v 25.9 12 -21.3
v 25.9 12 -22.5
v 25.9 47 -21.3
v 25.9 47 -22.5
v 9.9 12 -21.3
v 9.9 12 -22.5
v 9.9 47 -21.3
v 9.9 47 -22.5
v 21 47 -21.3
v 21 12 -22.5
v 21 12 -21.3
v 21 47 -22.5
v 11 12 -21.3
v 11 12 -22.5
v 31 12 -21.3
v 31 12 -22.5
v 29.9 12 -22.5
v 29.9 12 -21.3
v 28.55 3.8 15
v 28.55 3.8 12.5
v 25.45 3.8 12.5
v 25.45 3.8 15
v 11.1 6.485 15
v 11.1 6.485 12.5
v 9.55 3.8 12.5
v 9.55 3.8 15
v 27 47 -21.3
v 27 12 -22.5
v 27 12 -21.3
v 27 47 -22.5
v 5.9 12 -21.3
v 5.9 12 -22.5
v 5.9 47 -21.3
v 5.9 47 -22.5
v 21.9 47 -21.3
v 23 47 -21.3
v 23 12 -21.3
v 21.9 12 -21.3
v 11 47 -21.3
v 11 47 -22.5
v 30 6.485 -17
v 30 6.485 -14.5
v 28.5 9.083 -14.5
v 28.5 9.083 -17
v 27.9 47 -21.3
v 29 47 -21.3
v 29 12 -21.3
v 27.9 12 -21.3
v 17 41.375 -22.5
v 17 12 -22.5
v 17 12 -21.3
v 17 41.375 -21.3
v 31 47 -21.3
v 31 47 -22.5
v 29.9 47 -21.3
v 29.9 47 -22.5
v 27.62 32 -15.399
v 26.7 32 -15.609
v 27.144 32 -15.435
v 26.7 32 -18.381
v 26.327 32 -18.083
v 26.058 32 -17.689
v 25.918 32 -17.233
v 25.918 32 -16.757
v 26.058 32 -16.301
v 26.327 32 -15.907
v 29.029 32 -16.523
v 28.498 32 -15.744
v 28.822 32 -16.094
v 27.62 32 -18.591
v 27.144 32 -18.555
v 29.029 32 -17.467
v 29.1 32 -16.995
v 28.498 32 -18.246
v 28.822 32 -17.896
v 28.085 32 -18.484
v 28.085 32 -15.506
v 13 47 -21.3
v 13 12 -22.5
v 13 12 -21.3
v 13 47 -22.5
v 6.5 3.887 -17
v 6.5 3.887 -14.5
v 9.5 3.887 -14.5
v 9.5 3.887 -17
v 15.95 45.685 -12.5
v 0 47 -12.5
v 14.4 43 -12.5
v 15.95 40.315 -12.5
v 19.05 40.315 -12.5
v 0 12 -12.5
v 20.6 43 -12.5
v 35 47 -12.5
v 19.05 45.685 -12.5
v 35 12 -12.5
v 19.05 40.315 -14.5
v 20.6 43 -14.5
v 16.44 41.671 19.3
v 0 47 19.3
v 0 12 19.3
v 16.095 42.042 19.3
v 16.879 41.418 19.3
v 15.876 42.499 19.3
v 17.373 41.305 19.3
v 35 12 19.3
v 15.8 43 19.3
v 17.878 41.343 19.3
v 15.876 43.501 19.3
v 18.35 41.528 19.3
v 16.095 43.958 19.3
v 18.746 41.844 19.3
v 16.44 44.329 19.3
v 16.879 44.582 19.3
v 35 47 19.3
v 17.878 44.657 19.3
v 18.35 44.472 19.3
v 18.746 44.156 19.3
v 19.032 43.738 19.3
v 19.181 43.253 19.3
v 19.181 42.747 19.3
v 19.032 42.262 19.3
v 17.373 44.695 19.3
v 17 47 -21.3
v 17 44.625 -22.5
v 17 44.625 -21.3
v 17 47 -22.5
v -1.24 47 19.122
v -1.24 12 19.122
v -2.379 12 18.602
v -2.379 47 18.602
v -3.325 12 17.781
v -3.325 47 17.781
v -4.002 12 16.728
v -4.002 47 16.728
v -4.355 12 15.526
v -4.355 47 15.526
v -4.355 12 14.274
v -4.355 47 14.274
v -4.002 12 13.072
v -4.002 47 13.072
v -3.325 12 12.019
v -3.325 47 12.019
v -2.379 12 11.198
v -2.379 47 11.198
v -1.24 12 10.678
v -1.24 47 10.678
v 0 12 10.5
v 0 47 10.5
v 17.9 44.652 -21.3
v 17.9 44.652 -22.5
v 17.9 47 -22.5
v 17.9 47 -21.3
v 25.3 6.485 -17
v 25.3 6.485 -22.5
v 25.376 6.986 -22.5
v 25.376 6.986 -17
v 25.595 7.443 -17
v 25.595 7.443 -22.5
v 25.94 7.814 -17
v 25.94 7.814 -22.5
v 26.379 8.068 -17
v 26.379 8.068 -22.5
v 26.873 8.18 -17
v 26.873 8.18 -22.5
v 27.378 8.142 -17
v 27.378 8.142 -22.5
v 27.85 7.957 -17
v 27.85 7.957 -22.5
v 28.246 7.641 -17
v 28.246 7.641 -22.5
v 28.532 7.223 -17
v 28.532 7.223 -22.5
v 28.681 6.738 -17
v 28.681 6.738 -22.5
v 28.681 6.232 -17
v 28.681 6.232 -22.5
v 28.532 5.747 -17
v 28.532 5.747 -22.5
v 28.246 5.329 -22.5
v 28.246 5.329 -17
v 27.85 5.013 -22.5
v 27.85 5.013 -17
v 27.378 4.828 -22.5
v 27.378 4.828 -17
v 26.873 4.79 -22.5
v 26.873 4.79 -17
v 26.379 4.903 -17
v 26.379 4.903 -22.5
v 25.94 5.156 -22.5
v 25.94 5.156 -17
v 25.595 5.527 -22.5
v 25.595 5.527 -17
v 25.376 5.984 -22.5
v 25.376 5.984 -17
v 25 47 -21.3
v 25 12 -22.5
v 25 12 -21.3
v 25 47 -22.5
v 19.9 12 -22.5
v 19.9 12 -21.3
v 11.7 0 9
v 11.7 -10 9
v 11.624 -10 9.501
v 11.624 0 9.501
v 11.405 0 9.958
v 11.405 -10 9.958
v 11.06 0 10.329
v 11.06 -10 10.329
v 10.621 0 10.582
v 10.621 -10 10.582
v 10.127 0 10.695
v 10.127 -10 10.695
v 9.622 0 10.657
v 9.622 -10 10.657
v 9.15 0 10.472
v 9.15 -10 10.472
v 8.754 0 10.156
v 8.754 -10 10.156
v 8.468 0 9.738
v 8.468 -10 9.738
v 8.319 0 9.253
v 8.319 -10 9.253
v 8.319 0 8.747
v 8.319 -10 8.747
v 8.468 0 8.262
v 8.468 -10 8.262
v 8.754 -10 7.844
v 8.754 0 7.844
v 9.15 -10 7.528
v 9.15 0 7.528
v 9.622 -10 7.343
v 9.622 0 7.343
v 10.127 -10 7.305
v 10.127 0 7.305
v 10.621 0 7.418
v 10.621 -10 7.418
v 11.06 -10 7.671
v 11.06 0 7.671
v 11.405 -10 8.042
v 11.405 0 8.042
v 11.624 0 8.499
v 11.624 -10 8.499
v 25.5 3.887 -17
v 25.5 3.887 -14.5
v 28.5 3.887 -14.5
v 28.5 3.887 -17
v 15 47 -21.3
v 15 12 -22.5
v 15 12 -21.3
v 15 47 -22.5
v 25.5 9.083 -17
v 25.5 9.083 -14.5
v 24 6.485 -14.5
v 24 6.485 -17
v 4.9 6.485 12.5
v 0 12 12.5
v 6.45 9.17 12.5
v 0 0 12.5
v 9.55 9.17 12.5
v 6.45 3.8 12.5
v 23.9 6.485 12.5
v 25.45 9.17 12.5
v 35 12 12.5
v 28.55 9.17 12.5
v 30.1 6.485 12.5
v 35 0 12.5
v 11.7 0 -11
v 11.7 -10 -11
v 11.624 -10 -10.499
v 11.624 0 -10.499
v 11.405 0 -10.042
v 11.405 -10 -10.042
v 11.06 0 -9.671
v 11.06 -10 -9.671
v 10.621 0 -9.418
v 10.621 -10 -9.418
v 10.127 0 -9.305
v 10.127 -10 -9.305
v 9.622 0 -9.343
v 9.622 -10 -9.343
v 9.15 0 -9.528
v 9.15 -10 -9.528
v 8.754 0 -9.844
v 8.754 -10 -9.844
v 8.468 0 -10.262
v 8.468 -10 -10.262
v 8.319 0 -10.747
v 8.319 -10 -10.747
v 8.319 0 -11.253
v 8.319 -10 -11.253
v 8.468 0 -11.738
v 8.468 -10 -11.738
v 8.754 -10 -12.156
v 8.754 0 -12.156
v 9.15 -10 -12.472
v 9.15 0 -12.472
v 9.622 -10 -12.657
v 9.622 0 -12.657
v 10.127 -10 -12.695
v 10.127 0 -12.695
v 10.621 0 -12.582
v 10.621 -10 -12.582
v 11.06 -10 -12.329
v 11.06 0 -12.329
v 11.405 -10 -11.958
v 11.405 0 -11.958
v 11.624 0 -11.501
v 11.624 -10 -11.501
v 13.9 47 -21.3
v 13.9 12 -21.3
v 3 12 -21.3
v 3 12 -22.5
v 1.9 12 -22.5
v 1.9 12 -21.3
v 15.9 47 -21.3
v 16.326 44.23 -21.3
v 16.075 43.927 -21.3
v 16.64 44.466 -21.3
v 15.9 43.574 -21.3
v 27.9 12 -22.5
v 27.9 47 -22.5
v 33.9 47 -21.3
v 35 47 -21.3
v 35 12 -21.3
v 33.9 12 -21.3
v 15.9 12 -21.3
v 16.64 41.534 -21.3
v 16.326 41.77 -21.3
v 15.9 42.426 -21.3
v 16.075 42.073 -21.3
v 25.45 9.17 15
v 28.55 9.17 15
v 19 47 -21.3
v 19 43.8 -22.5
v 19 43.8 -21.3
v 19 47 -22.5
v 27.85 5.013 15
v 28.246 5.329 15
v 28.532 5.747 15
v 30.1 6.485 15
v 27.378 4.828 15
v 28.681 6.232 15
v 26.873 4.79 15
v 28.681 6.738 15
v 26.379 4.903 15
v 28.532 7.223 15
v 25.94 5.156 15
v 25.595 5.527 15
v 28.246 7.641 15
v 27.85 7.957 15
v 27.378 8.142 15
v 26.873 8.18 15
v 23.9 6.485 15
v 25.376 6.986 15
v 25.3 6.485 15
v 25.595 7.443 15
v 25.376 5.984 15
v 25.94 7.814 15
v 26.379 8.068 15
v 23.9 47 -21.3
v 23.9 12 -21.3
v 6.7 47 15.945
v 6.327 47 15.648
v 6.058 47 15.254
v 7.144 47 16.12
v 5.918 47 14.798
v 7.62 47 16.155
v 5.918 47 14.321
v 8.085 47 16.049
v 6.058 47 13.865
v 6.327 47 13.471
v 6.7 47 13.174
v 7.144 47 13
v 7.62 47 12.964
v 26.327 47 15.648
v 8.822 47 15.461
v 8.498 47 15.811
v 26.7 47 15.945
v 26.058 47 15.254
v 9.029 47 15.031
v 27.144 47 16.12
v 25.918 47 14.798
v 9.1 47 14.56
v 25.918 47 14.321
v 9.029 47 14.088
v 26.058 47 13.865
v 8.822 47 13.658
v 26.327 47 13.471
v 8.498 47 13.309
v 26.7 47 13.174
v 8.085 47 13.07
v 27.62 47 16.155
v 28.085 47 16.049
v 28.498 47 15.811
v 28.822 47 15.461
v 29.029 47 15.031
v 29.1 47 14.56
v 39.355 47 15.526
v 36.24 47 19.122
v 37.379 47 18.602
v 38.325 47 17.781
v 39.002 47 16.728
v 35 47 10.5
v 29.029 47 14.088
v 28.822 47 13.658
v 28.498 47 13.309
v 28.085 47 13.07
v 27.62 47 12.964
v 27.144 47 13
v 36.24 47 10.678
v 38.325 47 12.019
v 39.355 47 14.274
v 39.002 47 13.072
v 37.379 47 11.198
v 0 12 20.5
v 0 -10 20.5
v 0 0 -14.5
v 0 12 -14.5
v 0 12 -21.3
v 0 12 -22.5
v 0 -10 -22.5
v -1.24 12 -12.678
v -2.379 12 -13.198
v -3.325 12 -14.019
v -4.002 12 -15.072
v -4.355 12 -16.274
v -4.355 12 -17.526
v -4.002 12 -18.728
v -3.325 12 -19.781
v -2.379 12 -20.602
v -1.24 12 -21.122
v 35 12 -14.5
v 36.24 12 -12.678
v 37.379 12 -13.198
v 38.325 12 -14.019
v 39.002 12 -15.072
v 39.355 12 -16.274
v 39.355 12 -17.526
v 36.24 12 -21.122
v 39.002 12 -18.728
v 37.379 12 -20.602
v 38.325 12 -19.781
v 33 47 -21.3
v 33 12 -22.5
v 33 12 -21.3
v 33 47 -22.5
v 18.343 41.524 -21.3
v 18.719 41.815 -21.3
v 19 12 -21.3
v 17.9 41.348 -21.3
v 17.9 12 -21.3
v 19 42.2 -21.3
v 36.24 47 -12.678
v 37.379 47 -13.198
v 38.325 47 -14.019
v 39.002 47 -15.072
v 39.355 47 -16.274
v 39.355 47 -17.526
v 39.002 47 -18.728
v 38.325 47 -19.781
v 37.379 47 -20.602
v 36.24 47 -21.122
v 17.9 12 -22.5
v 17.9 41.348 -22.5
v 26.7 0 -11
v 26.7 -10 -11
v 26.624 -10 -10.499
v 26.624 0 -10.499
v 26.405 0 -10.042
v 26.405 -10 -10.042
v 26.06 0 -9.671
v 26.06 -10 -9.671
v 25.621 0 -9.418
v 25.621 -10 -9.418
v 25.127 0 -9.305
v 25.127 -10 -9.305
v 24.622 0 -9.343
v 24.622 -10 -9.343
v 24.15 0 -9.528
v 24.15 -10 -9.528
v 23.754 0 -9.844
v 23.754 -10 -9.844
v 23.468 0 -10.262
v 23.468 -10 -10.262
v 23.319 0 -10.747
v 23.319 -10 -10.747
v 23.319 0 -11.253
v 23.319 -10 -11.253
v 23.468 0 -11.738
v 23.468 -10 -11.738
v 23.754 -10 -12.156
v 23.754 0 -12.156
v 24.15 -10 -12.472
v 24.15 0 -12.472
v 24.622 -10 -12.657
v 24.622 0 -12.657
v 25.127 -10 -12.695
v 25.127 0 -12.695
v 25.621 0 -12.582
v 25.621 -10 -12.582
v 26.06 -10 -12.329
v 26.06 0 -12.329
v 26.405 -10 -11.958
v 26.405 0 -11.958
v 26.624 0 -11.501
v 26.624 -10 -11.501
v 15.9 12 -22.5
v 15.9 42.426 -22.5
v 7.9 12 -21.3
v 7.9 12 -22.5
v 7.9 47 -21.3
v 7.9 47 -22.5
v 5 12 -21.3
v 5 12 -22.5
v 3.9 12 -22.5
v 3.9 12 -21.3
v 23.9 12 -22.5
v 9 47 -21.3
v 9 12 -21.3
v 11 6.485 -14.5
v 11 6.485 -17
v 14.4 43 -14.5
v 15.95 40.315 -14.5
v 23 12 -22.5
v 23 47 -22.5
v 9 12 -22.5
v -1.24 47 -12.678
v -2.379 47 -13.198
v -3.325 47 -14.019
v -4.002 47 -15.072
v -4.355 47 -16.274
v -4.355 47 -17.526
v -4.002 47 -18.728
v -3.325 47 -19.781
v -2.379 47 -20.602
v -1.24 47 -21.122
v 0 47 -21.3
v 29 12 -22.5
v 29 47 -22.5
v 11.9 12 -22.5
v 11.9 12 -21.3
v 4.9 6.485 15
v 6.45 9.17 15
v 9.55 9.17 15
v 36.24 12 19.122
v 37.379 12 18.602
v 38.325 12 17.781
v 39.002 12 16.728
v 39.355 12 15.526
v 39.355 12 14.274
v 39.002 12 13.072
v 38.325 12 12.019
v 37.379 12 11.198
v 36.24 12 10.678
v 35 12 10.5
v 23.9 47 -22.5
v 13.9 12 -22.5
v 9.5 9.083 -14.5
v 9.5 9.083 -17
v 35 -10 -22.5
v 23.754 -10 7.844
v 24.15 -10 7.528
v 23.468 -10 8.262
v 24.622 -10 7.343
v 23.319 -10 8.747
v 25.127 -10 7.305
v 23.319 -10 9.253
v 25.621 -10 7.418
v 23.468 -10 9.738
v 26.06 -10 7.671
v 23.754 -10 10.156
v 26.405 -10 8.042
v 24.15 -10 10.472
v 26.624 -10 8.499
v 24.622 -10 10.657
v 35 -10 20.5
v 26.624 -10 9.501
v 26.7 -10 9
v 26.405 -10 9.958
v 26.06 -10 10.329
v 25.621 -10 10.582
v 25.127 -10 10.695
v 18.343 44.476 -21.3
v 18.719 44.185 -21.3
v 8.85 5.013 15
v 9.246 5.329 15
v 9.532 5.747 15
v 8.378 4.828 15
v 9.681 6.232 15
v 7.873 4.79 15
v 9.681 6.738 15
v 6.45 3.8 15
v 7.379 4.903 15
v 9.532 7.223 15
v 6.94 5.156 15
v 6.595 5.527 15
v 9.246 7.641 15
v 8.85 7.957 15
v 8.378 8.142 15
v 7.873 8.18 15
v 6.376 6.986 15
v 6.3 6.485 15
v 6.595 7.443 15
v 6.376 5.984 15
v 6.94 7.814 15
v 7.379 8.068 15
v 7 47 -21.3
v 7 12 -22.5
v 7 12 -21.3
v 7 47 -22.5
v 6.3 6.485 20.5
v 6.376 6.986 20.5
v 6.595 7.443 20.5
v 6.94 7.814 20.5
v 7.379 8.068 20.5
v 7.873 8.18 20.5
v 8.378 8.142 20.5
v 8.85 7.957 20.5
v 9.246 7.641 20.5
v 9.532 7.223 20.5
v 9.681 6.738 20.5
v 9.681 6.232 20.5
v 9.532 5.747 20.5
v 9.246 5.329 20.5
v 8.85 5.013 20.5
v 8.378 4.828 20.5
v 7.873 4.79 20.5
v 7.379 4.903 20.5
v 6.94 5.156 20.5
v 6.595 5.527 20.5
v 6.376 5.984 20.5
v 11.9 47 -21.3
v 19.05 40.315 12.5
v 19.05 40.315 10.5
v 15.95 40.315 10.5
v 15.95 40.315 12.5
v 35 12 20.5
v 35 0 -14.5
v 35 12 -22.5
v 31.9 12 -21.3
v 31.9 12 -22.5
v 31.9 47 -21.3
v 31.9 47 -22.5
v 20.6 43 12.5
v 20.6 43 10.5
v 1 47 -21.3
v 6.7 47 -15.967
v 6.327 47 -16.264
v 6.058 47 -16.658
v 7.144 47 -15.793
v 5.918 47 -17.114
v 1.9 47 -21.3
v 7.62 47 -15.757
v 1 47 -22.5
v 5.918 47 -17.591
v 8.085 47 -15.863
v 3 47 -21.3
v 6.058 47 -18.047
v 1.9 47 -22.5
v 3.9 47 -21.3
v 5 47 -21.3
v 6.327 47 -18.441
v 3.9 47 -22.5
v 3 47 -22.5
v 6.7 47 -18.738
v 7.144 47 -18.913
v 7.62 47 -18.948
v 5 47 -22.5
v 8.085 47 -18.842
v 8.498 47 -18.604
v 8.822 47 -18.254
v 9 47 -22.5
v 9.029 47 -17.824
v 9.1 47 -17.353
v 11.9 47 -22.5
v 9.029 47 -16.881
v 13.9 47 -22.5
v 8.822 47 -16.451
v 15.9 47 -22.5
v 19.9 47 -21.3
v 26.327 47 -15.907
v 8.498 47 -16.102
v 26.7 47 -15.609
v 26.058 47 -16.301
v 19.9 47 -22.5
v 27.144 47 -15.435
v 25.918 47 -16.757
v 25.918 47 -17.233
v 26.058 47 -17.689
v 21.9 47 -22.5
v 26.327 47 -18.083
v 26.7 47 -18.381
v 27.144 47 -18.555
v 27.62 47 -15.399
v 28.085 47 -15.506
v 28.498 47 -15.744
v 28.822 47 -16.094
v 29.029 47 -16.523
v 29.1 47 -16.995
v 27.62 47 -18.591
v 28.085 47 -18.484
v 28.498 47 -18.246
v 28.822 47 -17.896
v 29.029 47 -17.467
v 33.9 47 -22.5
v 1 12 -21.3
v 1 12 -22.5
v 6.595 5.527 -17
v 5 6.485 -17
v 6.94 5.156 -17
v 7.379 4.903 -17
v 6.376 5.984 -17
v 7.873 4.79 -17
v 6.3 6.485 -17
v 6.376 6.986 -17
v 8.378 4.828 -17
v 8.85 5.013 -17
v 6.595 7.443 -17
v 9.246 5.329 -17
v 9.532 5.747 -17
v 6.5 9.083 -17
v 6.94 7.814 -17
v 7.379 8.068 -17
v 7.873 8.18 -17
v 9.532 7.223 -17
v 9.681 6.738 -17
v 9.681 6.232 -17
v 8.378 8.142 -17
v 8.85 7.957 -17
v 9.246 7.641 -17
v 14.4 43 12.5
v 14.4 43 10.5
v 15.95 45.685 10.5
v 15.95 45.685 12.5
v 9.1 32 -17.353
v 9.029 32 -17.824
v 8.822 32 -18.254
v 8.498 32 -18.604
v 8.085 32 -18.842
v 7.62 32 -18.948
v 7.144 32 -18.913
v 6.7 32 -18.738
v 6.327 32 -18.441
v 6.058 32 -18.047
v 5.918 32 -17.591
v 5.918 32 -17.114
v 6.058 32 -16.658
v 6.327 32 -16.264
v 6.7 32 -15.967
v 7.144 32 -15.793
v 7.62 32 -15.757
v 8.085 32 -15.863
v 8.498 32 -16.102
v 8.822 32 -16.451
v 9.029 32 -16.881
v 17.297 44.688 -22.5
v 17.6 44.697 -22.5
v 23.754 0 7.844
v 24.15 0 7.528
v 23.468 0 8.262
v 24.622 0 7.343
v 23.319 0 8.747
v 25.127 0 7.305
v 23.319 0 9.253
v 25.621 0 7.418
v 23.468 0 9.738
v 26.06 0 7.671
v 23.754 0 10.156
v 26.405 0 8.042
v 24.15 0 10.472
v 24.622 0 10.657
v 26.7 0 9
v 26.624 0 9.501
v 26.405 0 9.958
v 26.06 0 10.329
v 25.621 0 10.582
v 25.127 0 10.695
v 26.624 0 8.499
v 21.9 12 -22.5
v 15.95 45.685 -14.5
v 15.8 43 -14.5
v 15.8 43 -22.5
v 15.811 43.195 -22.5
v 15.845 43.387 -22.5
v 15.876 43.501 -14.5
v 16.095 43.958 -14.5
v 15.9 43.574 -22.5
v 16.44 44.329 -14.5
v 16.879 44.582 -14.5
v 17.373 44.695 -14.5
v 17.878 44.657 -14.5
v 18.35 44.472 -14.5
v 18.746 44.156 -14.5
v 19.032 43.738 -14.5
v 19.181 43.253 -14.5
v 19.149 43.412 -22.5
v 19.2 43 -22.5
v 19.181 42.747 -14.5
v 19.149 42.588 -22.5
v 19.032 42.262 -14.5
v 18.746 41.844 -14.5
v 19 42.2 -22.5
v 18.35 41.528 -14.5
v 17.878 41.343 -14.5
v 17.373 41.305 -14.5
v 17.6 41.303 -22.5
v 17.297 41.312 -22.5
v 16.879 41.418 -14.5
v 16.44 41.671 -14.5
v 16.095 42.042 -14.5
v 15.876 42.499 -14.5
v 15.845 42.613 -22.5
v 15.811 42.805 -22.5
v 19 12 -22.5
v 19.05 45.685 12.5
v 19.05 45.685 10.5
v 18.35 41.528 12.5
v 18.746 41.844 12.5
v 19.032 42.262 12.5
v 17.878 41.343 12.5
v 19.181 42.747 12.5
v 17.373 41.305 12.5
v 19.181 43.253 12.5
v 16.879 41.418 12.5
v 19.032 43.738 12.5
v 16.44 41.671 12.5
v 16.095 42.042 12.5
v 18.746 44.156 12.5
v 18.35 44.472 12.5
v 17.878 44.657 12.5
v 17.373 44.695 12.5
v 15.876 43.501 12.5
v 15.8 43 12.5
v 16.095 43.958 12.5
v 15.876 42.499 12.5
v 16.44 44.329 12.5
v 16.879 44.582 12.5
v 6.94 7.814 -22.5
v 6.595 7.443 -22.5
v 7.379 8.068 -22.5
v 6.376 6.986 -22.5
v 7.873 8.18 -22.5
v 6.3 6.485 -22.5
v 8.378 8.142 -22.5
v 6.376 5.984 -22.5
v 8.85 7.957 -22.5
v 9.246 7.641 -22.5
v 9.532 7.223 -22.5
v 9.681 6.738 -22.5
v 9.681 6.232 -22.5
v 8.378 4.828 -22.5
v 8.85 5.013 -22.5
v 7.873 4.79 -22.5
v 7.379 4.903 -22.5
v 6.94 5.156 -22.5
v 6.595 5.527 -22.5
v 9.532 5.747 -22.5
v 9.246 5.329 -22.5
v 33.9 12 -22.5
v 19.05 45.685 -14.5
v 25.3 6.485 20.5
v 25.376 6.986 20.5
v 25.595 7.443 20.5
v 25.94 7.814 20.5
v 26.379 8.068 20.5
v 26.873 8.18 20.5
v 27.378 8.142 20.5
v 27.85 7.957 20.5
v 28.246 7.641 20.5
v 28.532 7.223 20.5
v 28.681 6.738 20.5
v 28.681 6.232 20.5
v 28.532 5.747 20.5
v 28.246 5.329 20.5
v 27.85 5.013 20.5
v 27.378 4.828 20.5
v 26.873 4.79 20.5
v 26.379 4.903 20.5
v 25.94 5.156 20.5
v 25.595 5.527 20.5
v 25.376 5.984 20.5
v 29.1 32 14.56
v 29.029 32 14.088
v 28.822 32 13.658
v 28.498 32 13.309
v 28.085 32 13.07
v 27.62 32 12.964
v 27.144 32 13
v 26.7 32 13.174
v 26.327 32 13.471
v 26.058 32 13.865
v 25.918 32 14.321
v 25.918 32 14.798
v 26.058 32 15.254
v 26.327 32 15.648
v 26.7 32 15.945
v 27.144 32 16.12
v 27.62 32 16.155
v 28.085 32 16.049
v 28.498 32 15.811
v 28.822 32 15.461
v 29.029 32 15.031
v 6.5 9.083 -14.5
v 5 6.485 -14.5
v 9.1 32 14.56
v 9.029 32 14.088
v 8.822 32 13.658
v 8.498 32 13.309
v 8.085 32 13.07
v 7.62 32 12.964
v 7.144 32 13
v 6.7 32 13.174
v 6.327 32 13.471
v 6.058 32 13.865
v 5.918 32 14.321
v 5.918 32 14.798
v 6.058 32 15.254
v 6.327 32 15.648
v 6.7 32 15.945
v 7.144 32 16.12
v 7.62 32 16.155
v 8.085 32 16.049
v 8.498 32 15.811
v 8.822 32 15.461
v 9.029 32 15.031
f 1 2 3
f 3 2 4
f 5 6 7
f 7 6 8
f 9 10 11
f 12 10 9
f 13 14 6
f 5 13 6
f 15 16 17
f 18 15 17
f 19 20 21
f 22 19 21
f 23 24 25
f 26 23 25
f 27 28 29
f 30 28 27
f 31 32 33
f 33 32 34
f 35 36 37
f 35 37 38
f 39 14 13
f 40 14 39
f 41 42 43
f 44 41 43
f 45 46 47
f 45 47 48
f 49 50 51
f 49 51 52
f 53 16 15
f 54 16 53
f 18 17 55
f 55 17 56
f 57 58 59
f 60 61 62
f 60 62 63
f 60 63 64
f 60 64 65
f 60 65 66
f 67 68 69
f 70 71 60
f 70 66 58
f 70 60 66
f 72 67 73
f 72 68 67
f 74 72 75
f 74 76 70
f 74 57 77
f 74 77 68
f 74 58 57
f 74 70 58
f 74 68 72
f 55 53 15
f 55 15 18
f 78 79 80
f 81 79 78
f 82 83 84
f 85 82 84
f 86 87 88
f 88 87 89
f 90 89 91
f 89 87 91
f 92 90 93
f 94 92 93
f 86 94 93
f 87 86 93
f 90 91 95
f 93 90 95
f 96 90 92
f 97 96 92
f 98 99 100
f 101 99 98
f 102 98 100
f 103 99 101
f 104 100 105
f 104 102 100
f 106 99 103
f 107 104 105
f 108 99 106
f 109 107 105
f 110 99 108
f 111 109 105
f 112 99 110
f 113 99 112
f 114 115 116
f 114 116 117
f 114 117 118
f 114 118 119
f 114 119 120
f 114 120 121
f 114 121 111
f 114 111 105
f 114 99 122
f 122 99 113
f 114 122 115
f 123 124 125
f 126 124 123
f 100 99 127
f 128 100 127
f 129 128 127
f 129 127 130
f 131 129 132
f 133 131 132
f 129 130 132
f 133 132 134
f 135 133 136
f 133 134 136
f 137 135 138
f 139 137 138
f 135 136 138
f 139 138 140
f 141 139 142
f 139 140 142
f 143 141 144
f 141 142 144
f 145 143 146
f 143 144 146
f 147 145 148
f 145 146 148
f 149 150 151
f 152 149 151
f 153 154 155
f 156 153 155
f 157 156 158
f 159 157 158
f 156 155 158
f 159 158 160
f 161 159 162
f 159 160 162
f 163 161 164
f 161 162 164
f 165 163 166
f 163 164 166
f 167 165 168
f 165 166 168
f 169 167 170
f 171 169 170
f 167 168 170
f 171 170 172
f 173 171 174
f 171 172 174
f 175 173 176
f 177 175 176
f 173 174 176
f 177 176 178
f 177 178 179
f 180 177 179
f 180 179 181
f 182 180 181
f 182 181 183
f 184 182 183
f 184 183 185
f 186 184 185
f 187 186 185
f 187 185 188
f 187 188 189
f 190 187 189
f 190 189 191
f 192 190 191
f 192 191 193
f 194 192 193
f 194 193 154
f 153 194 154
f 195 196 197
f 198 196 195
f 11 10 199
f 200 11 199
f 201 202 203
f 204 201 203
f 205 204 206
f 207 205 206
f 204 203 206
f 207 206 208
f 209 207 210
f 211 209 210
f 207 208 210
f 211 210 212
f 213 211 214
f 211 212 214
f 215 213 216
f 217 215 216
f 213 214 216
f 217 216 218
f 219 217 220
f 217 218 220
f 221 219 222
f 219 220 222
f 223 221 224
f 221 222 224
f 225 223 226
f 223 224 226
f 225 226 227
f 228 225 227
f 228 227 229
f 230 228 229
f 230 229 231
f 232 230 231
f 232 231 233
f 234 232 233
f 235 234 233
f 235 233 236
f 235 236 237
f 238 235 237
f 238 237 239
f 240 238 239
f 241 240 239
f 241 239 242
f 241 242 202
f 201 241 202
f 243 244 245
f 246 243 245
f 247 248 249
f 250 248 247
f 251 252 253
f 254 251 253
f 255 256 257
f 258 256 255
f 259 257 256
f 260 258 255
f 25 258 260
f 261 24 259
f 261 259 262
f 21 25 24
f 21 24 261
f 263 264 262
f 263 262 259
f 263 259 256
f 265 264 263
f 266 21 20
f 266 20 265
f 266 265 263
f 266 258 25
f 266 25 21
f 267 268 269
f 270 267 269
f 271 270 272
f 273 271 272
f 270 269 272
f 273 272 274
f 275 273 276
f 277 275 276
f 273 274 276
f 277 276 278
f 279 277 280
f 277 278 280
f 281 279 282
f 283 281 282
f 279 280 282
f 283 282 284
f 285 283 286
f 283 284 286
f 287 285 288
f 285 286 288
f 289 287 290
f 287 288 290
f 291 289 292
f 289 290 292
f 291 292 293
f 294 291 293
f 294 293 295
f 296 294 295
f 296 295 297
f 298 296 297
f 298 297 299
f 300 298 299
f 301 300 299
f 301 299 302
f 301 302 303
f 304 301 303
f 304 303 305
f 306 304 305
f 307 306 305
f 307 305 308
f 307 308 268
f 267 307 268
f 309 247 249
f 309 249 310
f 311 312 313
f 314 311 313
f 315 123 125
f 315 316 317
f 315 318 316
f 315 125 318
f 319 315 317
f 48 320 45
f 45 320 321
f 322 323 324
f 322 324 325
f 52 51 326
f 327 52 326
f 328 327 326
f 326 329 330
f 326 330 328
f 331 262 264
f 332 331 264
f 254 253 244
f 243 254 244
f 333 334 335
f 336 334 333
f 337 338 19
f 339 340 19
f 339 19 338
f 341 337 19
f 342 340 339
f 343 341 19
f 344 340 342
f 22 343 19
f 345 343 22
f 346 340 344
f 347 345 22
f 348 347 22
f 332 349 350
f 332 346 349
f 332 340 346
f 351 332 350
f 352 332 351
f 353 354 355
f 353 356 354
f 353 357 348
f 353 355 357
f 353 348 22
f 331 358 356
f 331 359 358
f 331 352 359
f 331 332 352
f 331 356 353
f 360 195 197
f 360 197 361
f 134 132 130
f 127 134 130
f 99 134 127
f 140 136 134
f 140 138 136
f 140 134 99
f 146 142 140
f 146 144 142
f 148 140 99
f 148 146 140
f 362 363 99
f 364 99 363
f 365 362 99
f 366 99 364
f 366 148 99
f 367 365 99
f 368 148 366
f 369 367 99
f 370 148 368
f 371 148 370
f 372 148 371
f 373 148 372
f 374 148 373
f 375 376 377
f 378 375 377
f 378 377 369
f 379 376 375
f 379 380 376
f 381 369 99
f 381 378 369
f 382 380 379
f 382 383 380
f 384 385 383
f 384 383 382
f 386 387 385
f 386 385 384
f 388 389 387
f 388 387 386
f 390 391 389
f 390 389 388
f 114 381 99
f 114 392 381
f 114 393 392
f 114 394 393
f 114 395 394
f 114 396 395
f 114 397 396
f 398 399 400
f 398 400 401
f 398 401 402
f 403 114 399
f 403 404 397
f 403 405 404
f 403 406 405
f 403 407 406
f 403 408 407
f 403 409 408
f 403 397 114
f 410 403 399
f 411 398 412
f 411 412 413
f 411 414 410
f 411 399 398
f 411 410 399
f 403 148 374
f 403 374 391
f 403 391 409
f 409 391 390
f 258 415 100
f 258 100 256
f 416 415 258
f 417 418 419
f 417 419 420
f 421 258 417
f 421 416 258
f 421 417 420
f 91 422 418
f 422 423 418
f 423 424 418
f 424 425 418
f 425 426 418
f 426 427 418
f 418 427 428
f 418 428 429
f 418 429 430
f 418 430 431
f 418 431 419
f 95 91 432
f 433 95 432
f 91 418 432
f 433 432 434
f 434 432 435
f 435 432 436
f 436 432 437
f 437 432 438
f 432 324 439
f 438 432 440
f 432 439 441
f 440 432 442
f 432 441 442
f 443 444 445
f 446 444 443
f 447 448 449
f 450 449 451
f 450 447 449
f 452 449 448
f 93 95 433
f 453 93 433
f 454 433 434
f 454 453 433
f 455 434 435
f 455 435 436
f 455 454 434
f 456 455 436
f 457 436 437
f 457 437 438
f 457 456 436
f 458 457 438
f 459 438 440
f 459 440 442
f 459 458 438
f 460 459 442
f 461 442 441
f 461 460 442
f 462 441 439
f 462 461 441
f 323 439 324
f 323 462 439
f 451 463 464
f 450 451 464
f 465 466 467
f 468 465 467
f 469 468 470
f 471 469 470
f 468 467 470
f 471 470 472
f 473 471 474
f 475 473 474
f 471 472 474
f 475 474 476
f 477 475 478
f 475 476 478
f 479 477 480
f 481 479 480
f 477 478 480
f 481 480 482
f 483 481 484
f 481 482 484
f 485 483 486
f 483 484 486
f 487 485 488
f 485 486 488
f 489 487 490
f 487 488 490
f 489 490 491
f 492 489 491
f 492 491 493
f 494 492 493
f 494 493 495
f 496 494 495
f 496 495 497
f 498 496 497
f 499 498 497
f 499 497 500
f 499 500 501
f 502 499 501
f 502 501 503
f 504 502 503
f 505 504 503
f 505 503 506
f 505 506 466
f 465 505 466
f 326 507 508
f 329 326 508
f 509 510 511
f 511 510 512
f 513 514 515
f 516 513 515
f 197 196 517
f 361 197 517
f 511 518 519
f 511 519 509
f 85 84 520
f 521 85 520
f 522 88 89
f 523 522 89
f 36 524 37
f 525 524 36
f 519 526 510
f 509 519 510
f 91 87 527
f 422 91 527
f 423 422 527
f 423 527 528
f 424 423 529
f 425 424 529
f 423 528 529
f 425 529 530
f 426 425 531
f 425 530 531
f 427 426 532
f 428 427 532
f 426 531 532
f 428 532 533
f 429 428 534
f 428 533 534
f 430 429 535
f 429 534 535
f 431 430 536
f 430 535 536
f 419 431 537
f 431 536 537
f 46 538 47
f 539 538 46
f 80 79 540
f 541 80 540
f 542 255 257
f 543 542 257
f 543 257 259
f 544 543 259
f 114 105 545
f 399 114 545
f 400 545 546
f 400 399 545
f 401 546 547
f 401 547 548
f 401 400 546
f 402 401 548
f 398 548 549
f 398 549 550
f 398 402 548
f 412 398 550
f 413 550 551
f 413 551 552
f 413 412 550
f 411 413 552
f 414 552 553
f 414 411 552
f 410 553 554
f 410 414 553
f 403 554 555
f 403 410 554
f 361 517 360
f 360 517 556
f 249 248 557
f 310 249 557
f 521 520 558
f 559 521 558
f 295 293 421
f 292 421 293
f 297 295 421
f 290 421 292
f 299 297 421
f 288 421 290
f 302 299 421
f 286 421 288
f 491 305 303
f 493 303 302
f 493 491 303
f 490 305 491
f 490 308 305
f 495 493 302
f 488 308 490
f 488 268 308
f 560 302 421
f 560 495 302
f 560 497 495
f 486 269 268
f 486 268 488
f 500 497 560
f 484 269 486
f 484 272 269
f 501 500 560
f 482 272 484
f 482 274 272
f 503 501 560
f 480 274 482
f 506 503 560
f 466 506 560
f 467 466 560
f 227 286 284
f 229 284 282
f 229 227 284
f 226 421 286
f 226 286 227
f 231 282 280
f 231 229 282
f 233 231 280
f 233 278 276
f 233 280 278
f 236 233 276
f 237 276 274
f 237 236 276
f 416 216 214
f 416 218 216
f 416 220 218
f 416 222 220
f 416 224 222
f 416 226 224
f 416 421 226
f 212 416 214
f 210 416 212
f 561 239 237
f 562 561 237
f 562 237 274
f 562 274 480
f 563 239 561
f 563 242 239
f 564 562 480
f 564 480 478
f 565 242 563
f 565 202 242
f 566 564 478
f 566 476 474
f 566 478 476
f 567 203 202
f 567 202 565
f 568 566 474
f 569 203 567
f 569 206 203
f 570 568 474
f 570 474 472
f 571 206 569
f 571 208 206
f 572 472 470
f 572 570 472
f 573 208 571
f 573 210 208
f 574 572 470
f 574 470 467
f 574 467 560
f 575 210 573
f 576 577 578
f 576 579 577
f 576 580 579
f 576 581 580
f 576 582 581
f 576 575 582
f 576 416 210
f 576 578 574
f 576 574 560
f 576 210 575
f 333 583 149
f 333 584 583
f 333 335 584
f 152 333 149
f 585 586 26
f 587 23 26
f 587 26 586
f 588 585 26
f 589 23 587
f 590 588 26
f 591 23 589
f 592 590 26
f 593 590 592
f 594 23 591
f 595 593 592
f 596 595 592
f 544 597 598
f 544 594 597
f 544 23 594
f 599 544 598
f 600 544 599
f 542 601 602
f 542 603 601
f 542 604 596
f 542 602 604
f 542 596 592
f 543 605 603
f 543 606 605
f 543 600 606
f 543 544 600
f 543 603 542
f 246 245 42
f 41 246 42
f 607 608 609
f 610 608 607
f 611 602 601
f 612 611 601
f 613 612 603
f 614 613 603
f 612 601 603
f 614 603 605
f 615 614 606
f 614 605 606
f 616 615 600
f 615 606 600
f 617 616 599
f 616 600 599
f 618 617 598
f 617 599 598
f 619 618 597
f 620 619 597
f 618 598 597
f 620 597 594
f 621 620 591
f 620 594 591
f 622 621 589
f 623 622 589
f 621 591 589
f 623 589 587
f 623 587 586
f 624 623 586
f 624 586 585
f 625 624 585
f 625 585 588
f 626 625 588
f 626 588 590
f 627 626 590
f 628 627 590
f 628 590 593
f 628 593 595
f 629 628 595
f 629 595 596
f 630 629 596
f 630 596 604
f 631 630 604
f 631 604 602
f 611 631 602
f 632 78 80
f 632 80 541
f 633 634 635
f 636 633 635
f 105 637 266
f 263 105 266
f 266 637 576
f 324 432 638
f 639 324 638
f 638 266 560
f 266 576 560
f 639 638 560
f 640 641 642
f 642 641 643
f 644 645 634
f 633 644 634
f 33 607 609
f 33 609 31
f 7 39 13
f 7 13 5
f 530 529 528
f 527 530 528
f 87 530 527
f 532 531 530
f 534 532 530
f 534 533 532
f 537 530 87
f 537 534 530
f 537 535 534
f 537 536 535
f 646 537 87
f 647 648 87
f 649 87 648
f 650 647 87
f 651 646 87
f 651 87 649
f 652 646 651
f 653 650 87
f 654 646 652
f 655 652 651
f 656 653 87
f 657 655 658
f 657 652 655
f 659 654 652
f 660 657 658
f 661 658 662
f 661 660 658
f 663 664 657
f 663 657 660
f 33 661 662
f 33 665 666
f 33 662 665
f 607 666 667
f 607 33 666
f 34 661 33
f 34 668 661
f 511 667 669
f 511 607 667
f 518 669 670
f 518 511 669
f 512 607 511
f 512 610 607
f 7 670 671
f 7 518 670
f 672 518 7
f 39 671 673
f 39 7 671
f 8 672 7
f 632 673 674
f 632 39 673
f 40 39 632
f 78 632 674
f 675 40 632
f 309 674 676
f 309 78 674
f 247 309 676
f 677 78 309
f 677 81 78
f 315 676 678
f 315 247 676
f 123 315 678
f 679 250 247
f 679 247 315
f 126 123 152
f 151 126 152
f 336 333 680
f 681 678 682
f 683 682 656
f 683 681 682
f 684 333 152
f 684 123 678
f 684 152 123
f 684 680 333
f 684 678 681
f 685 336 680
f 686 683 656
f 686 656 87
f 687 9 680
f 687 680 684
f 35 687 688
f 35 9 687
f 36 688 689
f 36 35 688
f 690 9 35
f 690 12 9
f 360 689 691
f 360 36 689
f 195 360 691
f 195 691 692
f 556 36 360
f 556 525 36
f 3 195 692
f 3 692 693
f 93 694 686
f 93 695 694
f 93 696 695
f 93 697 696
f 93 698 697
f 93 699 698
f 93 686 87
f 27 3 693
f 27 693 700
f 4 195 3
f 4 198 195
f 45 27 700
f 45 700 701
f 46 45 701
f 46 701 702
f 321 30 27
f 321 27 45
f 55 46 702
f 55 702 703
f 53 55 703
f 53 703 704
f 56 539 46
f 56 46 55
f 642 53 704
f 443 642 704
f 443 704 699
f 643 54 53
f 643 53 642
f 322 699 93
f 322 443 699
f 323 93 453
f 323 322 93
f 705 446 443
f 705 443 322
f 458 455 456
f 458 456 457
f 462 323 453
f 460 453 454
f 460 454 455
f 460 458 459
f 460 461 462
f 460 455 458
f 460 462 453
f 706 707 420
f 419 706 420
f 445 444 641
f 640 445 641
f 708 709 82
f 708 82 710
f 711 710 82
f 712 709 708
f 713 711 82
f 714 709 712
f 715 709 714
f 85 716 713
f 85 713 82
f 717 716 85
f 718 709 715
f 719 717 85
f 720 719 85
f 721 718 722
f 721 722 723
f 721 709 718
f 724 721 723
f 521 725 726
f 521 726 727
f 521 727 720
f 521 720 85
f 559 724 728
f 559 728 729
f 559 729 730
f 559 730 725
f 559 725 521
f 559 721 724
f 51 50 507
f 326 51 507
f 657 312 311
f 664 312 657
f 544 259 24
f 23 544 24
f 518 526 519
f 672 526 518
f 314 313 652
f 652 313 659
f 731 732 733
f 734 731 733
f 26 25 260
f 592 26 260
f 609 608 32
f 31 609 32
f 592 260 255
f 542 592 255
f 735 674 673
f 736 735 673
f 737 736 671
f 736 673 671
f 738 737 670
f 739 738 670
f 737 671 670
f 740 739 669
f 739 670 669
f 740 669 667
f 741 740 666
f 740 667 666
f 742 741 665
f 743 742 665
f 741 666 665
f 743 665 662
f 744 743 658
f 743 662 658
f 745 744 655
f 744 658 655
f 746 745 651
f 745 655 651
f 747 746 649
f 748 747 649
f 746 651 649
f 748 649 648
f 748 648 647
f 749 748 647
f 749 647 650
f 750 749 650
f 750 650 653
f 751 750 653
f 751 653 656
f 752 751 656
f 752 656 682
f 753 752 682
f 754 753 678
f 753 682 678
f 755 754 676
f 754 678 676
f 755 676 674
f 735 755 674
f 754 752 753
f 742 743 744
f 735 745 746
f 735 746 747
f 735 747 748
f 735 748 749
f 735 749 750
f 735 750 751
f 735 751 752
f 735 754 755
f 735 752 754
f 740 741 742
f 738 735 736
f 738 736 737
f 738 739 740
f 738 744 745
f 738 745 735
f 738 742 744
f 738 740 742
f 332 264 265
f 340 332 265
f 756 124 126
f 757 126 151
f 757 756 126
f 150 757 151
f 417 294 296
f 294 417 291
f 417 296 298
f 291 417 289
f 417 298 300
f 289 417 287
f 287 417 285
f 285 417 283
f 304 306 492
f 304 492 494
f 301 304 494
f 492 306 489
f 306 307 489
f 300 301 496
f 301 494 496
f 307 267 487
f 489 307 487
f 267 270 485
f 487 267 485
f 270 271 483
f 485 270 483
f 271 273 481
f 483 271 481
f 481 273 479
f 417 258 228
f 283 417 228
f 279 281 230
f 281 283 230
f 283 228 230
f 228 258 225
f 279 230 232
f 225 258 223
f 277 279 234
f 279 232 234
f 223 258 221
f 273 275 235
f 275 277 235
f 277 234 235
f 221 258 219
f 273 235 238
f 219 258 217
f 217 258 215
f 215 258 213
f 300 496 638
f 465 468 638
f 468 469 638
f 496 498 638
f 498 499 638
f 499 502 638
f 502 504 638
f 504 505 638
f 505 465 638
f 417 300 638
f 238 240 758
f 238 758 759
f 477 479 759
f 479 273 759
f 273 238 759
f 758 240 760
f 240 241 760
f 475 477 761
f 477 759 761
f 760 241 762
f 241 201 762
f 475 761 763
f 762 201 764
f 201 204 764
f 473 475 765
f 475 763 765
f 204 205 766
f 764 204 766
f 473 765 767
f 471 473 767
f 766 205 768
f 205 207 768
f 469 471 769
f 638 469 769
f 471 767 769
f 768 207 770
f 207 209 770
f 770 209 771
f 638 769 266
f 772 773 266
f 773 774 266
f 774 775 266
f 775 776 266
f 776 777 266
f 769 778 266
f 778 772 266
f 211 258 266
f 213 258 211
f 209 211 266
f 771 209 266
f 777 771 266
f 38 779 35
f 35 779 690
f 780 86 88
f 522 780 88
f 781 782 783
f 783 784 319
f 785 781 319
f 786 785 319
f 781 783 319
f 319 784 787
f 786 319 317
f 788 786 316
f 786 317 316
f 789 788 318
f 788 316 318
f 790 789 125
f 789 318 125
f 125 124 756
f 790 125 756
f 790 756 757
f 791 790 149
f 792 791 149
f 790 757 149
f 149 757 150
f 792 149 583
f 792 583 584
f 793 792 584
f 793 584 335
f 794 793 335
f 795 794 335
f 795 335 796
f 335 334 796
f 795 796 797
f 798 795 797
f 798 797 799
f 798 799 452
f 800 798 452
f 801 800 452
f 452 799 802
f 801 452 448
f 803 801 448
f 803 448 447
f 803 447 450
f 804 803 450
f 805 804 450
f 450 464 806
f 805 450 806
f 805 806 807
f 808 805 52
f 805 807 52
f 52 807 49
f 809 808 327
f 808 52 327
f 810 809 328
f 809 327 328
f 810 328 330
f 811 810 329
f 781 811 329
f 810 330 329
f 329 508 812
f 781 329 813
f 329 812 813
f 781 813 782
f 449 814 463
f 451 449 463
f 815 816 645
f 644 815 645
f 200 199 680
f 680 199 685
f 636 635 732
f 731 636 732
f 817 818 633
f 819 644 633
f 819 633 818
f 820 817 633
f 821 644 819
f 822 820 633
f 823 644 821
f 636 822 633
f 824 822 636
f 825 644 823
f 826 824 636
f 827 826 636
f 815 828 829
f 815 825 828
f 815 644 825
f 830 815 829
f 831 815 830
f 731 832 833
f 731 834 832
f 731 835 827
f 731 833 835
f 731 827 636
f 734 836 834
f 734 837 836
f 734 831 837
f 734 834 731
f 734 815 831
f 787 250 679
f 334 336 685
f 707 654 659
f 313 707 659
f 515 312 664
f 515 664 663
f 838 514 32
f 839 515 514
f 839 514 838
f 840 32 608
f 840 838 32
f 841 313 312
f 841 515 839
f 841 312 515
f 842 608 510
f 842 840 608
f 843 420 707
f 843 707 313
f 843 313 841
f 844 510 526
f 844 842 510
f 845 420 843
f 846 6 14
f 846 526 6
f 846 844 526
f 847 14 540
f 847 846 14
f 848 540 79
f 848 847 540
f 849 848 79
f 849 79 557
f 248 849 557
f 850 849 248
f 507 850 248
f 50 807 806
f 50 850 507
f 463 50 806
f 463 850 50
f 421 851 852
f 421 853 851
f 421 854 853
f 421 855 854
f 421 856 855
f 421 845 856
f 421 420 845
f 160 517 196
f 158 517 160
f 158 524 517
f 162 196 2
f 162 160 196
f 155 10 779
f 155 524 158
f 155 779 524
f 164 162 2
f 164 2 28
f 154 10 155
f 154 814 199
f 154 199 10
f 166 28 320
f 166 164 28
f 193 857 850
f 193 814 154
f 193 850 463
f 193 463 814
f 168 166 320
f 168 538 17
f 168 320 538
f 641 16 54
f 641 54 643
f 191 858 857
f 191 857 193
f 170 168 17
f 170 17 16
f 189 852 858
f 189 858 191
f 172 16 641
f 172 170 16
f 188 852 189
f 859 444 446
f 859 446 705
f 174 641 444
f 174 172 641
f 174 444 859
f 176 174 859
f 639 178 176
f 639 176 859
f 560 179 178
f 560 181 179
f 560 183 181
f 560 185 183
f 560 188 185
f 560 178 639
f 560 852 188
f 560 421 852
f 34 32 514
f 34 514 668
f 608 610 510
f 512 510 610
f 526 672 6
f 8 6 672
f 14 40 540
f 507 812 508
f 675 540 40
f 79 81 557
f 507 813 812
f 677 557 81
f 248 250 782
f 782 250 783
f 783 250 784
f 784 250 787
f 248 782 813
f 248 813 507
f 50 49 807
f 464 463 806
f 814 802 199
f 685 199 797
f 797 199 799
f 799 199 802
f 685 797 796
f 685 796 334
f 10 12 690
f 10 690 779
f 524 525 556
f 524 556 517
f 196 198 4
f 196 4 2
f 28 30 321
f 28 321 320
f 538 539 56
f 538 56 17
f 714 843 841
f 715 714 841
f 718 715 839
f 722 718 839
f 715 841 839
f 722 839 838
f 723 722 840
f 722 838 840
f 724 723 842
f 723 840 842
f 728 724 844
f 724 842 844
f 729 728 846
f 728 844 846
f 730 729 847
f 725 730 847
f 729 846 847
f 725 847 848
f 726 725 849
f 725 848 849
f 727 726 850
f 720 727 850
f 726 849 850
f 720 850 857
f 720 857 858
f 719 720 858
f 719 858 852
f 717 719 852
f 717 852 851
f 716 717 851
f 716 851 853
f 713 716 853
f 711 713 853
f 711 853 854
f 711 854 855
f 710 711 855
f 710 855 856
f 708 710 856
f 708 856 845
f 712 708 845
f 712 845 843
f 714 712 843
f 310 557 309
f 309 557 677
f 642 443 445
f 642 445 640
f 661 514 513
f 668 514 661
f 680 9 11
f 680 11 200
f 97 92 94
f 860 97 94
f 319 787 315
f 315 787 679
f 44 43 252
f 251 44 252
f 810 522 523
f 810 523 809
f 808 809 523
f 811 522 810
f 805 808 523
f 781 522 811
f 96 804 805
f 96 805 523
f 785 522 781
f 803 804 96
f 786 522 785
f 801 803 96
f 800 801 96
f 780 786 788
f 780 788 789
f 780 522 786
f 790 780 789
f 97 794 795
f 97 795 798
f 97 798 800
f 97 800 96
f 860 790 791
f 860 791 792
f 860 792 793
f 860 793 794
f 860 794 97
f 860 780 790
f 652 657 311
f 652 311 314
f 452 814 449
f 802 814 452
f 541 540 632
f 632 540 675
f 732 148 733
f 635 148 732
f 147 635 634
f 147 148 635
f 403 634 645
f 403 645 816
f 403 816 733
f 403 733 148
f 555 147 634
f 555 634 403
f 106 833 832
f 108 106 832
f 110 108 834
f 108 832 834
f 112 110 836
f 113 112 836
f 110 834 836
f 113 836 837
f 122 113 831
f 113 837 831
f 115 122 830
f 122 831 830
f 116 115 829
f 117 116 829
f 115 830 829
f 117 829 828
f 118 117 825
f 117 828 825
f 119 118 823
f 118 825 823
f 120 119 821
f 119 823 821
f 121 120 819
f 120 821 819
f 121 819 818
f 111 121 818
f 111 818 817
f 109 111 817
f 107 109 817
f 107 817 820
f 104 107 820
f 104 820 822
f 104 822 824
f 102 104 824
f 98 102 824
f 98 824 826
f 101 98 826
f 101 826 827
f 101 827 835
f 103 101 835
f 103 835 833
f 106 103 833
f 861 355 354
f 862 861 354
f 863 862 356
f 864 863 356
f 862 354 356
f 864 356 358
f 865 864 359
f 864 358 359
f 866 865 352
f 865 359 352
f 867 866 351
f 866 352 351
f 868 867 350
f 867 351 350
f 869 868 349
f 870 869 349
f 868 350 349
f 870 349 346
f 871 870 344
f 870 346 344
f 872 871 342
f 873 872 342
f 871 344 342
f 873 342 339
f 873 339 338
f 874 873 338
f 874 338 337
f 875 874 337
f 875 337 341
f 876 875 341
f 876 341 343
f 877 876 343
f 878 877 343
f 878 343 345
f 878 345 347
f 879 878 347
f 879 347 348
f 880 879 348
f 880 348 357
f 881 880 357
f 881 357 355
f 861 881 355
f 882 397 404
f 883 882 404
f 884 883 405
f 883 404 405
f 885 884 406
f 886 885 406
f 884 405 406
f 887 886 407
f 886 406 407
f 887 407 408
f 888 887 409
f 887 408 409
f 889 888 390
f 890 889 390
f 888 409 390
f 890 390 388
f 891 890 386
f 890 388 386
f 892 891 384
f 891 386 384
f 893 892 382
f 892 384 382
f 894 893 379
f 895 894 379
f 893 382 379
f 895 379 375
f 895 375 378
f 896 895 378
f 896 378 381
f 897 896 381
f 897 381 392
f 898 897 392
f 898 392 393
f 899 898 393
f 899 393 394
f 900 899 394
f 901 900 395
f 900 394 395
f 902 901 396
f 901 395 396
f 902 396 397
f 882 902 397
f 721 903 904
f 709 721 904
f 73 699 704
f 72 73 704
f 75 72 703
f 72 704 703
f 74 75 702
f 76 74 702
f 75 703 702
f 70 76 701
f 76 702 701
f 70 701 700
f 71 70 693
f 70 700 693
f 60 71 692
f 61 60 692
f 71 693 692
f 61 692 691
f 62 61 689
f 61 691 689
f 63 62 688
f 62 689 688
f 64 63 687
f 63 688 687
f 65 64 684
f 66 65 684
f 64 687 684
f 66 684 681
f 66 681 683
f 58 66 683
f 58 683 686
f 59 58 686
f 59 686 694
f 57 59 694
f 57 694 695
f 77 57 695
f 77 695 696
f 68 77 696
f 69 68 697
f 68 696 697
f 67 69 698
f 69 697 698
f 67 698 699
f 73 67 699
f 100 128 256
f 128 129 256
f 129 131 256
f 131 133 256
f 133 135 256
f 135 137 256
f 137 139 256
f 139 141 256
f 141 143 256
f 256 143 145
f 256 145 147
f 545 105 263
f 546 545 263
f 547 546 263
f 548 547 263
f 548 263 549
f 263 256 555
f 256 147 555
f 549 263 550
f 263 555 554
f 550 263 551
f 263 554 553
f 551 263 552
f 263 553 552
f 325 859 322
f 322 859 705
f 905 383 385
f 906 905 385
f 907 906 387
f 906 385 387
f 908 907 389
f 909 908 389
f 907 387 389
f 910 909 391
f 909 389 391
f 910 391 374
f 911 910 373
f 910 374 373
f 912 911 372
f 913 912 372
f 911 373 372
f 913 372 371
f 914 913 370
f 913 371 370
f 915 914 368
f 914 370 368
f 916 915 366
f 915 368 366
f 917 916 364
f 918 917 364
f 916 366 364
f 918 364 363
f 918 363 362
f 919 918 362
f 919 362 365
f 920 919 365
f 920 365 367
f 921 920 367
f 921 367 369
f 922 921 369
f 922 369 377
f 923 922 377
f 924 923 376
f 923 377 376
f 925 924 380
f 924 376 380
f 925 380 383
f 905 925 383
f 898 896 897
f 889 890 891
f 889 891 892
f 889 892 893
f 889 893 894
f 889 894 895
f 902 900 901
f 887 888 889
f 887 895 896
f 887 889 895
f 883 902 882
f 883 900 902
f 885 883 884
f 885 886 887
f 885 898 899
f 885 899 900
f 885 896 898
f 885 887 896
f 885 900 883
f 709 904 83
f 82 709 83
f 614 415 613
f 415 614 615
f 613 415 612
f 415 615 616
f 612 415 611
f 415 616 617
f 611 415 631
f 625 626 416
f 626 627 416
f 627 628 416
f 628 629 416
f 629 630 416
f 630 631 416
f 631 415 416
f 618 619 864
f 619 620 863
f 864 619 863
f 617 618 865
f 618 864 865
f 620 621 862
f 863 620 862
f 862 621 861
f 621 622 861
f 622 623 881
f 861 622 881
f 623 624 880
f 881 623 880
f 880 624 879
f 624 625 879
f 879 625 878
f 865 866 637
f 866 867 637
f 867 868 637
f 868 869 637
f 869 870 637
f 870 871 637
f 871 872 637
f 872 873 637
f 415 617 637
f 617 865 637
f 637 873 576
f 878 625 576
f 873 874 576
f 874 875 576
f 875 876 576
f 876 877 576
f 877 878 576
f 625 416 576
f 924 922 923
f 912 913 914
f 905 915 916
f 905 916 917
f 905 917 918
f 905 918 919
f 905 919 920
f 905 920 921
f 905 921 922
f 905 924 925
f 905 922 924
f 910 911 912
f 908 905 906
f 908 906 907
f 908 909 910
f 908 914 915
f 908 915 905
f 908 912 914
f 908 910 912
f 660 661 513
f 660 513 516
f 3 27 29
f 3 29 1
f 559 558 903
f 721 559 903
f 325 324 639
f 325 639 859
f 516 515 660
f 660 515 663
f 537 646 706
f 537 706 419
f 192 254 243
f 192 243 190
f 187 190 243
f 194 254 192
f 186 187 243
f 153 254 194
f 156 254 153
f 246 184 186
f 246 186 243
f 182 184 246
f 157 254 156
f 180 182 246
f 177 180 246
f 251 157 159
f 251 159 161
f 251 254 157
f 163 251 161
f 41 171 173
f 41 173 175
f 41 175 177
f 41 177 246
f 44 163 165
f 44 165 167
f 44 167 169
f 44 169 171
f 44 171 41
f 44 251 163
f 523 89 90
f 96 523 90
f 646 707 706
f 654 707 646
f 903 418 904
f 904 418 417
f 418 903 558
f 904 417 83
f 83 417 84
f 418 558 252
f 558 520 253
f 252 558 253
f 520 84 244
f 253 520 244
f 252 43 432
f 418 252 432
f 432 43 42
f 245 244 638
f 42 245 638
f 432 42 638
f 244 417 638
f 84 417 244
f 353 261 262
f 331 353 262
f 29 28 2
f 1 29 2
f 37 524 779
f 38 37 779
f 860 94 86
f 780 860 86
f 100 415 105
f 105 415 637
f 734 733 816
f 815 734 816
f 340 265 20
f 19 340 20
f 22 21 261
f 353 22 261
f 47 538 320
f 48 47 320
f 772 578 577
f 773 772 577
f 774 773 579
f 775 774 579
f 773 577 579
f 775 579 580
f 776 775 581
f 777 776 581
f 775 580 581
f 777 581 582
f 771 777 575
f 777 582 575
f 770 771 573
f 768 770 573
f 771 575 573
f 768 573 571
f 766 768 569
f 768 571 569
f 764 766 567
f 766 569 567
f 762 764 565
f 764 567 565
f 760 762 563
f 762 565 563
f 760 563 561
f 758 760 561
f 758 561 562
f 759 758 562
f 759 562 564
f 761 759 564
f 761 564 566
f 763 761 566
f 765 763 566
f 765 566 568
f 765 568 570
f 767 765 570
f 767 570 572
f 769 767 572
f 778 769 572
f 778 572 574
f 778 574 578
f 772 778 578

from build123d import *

# Parameters (mm, degrees)
SKETCH11_W          = 35
SKETCH11_H          = 27
BOSS_EXTRUDE6_DEPTH = 10
SKETCH12_R          = 1.7
CUT_EXTRUDE3_DEPTH  = 11
SKETCH13_W          = 35
SKETCH13_H          = 8
BOSS_EXTRUDE7_DEPTH = 22
SKETCH14_W          = 35
SKETCH14_H          = 10
BOSS_EXTRUDE8_DEPTH = 35
SKETCH17_W          = 35
SKETCH17_H          = 35
CUT_EXTRUDE6_DEPTH  = 1.2
SKETCH18_W          = 1.1
SKETCH18_H          = 35
CUT_EXTRUDE7_DEPTH  = 1.2
SKETCH19_R          = 1.7
CUT_EXTRUDE8_DEPTH  = 44
CUT_EXTRUDE9_DEPTH  = 2.5
CUT_EXTRUDE10_DEPTH = 2.5
BOSS_EXTRUDE9_DEPTH = 35
SKETCH23_R          = 1.6
CUT_EXTRUDE11_DEPTH = 15
CUT_EXTRUDE12_DEPTH = 2
CUT_EXTRUDE13_DEPTH = 2


with BuildPart() as part:
    # Sketch11 → Boss-Extrude6 (new body)
    with BuildSketch(Plane(origin=(0, 0, 12.5), x_dir=(1, 0, 0), z_dir=(0, -1, 0))):
        with Locations((17.5, -13.5)):
            Rectangle(SKETCH11_W, SKETCH11_H)
    extrude(amount=BOSS_EXTRUDE6_DEPTH)

    # Sketch12 → Cut-Extrude3 (cut, through all)
    with BuildSketch(Plane.XZ.offset(10)):
        with Locations((10, 9)):
            Circle(SKETCH12_R)
        with Locations((25, 9)):
            Circle(SKETCH12_R)
        with Locations((25, -11)):
            Circle(SKETCH12_R)
        with Locations((10, -11)):
            Circle(SKETCH12_R)
    extrude(amount=-CUT_EXTRUDE3_DEPTH, mode=Mode.SUBTRACT)

    # Sketch13 → Boss-Extrude7 (add)
    with BuildSketch(Plane.XZ.offset(10)):
        with Locations((17.5, -18.5)):
            Rectangle(SKETCH13_W, SKETCH13_H)
        with Locations((17.5, 16.5)):
            Rectangle(SKETCH13_W, SKETCH13_H)
    extrude(amount=-BOSS_EXTRUDE7_DEPTH)

    # Sketch14 → Boss-Extrude8 (add)
    with BuildSketch(Plane(origin=(0, 12, 0), x_dir=(1, 0, 0), z_dir=(0, 1, 0))):
        with Locations((17.5, -15.5)):
            Rectangle(SKETCH14_W, SKETCH14_H)
        with Locations((17.5, 17.5)):
            Rectangle(SKETCH14_W, SKETCH14_H)
    extrude(amount=BOSS_EXTRUDE8_DEPTH)

    # Sketch17 → Cut-Extrude6 (cut)
    with BuildSketch(Plane.XY.offset(20.5)):
        with Locations((17.5, 29.5)):
            Rectangle(SKETCH17_W, SKETCH17_H)
    extrude(amount=-CUT_EXTRUDE6_DEPTH, mode=Mode.SUBTRACT)

    # Sketch18 → Cut-Extrude7 (cut)
    with BuildSketch(Plane(origin=(0, 0, -22.5), x_dir=(-1, 0, 0), z_dir=(0, 0, -1))):
        with Locations((-32.45, 29.5)):
            Rectangle(SKETCH18_W, SKETCH18_H)
        with Locations((-34.45, 29.5)):
            Rectangle(SKETCH18_W, SKETCH18_H)
        with Locations((-30.45, 29.5)):
            Rectangle(SKETCH18_W, SKETCH18_H)
        with Locations((-28.45, 29.5)):
            Rectangle(SKETCH18_W, SKETCH18_H)
        with Locations((-26.45, 29.5)):
            Rectangle(SKETCH18_W, SKETCH18_H)
        with Locations((-24.45, 29.5)):
            Rectangle(SKETCH18_W, SKETCH18_H)
        with Locations((-22.45, 29.5)):
            Rectangle(SKETCH18_W, SKETCH18_H)
        with Locations((-20.45, 29.5)):
            Rectangle(SKETCH18_W, SKETCH18_H)
        with Locations((-18.45, 29.5)):
            Rectangle(SKETCH18_W, SKETCH18_H)
        with Locations((-16.45, 29.5)):
            Rectangle(SKETCH18_W, SKETCH18_H)
        with Locations((-14.45, 29.5)):
            Rectangle(SKETCH18_W, SKETCH18_H)
        with Locations((-12.45, 29.5)):
            Rectangle(SKETCH18_W, SKETCH18_H)
        with Locations((-10.45, 29.5)):
            Rectangle(SKETCH18_W, SKETCH18_H)
        with Locations((-8.45, 29.5)):
            Rectangle(SKETCH18_W, SKETCH18_H)
        with Locations((-6.45, 29.5)):
            Rectangle(SKETCH18_W, SKETCH18_H)
        with Locations((-4.45, 29.5)):
            Rectangle(SKETCH18_W, SKETCH18_H)
        with Locations((-2.45, 29.5)):
            Rectangle(SKETCH18_W, SKETCH18_H)
        with Locations((-0.45, 29.5)):
            Rectangle(SKETCH18_W, SKETCH18_H)
    extrude(amount=-CUT_EXTRUDE7_DEPTH, mode=Mode.SUBTRACT)

    # Sketch19 → Cut-Extrude8 (cut, through all)
    with BuildSketch(Plane(origin=(0, 0, -22.5), x_dir=(-1, 0, 0), z_dir=(0, 0, -1))):
        with Locations((-27, 6.485099569)):
            Circle(SKETCH19_R)
        with Locations((-8, 6.485099569)):
            Circle(SKETCH19_R)
        with Locations((-17.5, 43)):
            Circle(SKETCH19_R)
    extrude(amount=-CUT_EXTRUDE8_DEPTH, mode=Mode.SUBTRACT)

    # Sketch20 → Cut-Extrude9 (cut)
    with BuildSketch(Plane.XY.offset(-14.5)):
        Polygon((28.5, 3.887023357), (30, 6.485099569), (28.5, 9.08317578), (25.5, 9.08317578), (24, 6.485099569), (25.5, 3.887023357), align=None)
        Polygon((9.5, 3.887023357), (11, 6.485099569), (9.5, 9.08317578), (6.5, 9.08317578), (5, 6.485099569), (6.5, 3.887023357), align=None)
    extrude(amount=-CUT_EXTRUDE9_DEPTH, mode=Mode.SUBTRACT)

    # Sketch21 → Cut-Extrude10 (cut)
    with BuildSketch(Plane(origin=(0, 0, 12.5), x_dir=(-1, 0, 0), z_dir=(0, 0, -1))):
        Polygon((-6.45, 3.800420817), (-4.9, 6.485099569), (-6.45, 9.16977832), (-9.55, 9.16977832), (-11.1, 6.485099569), (-9.55, 3.800420817), align=None)
        Polygon((-25.45, 3.800420817), (-23.9, 6.485099569), (-25.45, 9.16977832), (-28.55, 9.16977832), (-30.1, 6.485099569), (-28.55, 3.800420817), align=None)
    extrude(amount=-CUT_EXTRUDE10_DEPTH, mode=Mode.SUBTRACT)

    # Sketch22 → Boss-Extrude9 (add)
    with BuildSketch(Plane(origin=(0, 47, 0), x_dir=(1, 0, 0), z_dir=(0, 1, 0))):
        with BuildLine():
            Line((35, 21.3), (35, 12.5))
            ThreePointArc((35, 12.5), (39.4, 16.9), (35, 21.3))
        make_face()
        with BuildLine():
            Line((35, -10.5), (35, -19.3))
            ThreePointArc((35, -19.3), (39.4, -14.9), (35, -10.5))
        make_face()
        with BuildLine():
            Line((0, 21.3), (0, 12.5))
            ThreePointArc((0, 12.5), (-4.4, 16.9), (0, 21.3))
        make_face()
        with BuildLine():
            Line((0, -10.5), (0, -19.3))
            ThreePointArc((0, -19.3), (-4.4, -14.9), (0, -10.5))
        make_face()
    extrude(amount=-BOSS_EXTRUDE9_DEPTH)

    # Sketch23 → Cut-Extrude11 (cut)
    with BuildSketch(Plane(origin=(0, 47, 0), x_dir=(1, 0, 0), z_dir=(0, 1, 0))):
        with Locations((7.5, 17.352667036)):
            Circle(SKETCH23_R)
        with Locations((27.5, 16.995008076)):
            Circle(SKETCH23_R)
        with Locations((27.5, -14.559659808)):
            Circle(SKETCH23_R)
        with Locations((7.5, -14.559659808)):
            Circle(SKETCH23_R)
    extrude(amount=-CUT_EXTRUDE11_DEPTH, mode=Mode.SUBTRACT)

    # Sketch24 → Cut-Extrude12 (cut)
    with BuildSketch(Plane(origin=(0, 0, 10.5), x_dir=(-1, 0, 0), z_dir=(0, 0, -1))):
        Polygon((-15.95, 40.315321248), (-14.4, 43), (-15.95, 45.684678752), (-19.05, 45.684678752), (-20.6, 43), (-19.05, 40.315321248), align=None)
    extrude(amount=-CUT_EXTRUDE12_DEPTH, mode=Mode.SUBTRACT)

    # Sketch25 → Cut-Extrude13 (cut)
    with BuildSketch(Plane.XY.offset(-12.5)):
        Polygon((19.05, 40.315321248), (20.6, 43), (19.05, 45.684678752), (15.95, 45.684678752), (14.4, 43), (15.95, 40.315321248), align=None)
    extrude(amount=-CUT_EXTRUDE13_DEPTH, mode=Mode.SUBTRACT)


solid = part.part
